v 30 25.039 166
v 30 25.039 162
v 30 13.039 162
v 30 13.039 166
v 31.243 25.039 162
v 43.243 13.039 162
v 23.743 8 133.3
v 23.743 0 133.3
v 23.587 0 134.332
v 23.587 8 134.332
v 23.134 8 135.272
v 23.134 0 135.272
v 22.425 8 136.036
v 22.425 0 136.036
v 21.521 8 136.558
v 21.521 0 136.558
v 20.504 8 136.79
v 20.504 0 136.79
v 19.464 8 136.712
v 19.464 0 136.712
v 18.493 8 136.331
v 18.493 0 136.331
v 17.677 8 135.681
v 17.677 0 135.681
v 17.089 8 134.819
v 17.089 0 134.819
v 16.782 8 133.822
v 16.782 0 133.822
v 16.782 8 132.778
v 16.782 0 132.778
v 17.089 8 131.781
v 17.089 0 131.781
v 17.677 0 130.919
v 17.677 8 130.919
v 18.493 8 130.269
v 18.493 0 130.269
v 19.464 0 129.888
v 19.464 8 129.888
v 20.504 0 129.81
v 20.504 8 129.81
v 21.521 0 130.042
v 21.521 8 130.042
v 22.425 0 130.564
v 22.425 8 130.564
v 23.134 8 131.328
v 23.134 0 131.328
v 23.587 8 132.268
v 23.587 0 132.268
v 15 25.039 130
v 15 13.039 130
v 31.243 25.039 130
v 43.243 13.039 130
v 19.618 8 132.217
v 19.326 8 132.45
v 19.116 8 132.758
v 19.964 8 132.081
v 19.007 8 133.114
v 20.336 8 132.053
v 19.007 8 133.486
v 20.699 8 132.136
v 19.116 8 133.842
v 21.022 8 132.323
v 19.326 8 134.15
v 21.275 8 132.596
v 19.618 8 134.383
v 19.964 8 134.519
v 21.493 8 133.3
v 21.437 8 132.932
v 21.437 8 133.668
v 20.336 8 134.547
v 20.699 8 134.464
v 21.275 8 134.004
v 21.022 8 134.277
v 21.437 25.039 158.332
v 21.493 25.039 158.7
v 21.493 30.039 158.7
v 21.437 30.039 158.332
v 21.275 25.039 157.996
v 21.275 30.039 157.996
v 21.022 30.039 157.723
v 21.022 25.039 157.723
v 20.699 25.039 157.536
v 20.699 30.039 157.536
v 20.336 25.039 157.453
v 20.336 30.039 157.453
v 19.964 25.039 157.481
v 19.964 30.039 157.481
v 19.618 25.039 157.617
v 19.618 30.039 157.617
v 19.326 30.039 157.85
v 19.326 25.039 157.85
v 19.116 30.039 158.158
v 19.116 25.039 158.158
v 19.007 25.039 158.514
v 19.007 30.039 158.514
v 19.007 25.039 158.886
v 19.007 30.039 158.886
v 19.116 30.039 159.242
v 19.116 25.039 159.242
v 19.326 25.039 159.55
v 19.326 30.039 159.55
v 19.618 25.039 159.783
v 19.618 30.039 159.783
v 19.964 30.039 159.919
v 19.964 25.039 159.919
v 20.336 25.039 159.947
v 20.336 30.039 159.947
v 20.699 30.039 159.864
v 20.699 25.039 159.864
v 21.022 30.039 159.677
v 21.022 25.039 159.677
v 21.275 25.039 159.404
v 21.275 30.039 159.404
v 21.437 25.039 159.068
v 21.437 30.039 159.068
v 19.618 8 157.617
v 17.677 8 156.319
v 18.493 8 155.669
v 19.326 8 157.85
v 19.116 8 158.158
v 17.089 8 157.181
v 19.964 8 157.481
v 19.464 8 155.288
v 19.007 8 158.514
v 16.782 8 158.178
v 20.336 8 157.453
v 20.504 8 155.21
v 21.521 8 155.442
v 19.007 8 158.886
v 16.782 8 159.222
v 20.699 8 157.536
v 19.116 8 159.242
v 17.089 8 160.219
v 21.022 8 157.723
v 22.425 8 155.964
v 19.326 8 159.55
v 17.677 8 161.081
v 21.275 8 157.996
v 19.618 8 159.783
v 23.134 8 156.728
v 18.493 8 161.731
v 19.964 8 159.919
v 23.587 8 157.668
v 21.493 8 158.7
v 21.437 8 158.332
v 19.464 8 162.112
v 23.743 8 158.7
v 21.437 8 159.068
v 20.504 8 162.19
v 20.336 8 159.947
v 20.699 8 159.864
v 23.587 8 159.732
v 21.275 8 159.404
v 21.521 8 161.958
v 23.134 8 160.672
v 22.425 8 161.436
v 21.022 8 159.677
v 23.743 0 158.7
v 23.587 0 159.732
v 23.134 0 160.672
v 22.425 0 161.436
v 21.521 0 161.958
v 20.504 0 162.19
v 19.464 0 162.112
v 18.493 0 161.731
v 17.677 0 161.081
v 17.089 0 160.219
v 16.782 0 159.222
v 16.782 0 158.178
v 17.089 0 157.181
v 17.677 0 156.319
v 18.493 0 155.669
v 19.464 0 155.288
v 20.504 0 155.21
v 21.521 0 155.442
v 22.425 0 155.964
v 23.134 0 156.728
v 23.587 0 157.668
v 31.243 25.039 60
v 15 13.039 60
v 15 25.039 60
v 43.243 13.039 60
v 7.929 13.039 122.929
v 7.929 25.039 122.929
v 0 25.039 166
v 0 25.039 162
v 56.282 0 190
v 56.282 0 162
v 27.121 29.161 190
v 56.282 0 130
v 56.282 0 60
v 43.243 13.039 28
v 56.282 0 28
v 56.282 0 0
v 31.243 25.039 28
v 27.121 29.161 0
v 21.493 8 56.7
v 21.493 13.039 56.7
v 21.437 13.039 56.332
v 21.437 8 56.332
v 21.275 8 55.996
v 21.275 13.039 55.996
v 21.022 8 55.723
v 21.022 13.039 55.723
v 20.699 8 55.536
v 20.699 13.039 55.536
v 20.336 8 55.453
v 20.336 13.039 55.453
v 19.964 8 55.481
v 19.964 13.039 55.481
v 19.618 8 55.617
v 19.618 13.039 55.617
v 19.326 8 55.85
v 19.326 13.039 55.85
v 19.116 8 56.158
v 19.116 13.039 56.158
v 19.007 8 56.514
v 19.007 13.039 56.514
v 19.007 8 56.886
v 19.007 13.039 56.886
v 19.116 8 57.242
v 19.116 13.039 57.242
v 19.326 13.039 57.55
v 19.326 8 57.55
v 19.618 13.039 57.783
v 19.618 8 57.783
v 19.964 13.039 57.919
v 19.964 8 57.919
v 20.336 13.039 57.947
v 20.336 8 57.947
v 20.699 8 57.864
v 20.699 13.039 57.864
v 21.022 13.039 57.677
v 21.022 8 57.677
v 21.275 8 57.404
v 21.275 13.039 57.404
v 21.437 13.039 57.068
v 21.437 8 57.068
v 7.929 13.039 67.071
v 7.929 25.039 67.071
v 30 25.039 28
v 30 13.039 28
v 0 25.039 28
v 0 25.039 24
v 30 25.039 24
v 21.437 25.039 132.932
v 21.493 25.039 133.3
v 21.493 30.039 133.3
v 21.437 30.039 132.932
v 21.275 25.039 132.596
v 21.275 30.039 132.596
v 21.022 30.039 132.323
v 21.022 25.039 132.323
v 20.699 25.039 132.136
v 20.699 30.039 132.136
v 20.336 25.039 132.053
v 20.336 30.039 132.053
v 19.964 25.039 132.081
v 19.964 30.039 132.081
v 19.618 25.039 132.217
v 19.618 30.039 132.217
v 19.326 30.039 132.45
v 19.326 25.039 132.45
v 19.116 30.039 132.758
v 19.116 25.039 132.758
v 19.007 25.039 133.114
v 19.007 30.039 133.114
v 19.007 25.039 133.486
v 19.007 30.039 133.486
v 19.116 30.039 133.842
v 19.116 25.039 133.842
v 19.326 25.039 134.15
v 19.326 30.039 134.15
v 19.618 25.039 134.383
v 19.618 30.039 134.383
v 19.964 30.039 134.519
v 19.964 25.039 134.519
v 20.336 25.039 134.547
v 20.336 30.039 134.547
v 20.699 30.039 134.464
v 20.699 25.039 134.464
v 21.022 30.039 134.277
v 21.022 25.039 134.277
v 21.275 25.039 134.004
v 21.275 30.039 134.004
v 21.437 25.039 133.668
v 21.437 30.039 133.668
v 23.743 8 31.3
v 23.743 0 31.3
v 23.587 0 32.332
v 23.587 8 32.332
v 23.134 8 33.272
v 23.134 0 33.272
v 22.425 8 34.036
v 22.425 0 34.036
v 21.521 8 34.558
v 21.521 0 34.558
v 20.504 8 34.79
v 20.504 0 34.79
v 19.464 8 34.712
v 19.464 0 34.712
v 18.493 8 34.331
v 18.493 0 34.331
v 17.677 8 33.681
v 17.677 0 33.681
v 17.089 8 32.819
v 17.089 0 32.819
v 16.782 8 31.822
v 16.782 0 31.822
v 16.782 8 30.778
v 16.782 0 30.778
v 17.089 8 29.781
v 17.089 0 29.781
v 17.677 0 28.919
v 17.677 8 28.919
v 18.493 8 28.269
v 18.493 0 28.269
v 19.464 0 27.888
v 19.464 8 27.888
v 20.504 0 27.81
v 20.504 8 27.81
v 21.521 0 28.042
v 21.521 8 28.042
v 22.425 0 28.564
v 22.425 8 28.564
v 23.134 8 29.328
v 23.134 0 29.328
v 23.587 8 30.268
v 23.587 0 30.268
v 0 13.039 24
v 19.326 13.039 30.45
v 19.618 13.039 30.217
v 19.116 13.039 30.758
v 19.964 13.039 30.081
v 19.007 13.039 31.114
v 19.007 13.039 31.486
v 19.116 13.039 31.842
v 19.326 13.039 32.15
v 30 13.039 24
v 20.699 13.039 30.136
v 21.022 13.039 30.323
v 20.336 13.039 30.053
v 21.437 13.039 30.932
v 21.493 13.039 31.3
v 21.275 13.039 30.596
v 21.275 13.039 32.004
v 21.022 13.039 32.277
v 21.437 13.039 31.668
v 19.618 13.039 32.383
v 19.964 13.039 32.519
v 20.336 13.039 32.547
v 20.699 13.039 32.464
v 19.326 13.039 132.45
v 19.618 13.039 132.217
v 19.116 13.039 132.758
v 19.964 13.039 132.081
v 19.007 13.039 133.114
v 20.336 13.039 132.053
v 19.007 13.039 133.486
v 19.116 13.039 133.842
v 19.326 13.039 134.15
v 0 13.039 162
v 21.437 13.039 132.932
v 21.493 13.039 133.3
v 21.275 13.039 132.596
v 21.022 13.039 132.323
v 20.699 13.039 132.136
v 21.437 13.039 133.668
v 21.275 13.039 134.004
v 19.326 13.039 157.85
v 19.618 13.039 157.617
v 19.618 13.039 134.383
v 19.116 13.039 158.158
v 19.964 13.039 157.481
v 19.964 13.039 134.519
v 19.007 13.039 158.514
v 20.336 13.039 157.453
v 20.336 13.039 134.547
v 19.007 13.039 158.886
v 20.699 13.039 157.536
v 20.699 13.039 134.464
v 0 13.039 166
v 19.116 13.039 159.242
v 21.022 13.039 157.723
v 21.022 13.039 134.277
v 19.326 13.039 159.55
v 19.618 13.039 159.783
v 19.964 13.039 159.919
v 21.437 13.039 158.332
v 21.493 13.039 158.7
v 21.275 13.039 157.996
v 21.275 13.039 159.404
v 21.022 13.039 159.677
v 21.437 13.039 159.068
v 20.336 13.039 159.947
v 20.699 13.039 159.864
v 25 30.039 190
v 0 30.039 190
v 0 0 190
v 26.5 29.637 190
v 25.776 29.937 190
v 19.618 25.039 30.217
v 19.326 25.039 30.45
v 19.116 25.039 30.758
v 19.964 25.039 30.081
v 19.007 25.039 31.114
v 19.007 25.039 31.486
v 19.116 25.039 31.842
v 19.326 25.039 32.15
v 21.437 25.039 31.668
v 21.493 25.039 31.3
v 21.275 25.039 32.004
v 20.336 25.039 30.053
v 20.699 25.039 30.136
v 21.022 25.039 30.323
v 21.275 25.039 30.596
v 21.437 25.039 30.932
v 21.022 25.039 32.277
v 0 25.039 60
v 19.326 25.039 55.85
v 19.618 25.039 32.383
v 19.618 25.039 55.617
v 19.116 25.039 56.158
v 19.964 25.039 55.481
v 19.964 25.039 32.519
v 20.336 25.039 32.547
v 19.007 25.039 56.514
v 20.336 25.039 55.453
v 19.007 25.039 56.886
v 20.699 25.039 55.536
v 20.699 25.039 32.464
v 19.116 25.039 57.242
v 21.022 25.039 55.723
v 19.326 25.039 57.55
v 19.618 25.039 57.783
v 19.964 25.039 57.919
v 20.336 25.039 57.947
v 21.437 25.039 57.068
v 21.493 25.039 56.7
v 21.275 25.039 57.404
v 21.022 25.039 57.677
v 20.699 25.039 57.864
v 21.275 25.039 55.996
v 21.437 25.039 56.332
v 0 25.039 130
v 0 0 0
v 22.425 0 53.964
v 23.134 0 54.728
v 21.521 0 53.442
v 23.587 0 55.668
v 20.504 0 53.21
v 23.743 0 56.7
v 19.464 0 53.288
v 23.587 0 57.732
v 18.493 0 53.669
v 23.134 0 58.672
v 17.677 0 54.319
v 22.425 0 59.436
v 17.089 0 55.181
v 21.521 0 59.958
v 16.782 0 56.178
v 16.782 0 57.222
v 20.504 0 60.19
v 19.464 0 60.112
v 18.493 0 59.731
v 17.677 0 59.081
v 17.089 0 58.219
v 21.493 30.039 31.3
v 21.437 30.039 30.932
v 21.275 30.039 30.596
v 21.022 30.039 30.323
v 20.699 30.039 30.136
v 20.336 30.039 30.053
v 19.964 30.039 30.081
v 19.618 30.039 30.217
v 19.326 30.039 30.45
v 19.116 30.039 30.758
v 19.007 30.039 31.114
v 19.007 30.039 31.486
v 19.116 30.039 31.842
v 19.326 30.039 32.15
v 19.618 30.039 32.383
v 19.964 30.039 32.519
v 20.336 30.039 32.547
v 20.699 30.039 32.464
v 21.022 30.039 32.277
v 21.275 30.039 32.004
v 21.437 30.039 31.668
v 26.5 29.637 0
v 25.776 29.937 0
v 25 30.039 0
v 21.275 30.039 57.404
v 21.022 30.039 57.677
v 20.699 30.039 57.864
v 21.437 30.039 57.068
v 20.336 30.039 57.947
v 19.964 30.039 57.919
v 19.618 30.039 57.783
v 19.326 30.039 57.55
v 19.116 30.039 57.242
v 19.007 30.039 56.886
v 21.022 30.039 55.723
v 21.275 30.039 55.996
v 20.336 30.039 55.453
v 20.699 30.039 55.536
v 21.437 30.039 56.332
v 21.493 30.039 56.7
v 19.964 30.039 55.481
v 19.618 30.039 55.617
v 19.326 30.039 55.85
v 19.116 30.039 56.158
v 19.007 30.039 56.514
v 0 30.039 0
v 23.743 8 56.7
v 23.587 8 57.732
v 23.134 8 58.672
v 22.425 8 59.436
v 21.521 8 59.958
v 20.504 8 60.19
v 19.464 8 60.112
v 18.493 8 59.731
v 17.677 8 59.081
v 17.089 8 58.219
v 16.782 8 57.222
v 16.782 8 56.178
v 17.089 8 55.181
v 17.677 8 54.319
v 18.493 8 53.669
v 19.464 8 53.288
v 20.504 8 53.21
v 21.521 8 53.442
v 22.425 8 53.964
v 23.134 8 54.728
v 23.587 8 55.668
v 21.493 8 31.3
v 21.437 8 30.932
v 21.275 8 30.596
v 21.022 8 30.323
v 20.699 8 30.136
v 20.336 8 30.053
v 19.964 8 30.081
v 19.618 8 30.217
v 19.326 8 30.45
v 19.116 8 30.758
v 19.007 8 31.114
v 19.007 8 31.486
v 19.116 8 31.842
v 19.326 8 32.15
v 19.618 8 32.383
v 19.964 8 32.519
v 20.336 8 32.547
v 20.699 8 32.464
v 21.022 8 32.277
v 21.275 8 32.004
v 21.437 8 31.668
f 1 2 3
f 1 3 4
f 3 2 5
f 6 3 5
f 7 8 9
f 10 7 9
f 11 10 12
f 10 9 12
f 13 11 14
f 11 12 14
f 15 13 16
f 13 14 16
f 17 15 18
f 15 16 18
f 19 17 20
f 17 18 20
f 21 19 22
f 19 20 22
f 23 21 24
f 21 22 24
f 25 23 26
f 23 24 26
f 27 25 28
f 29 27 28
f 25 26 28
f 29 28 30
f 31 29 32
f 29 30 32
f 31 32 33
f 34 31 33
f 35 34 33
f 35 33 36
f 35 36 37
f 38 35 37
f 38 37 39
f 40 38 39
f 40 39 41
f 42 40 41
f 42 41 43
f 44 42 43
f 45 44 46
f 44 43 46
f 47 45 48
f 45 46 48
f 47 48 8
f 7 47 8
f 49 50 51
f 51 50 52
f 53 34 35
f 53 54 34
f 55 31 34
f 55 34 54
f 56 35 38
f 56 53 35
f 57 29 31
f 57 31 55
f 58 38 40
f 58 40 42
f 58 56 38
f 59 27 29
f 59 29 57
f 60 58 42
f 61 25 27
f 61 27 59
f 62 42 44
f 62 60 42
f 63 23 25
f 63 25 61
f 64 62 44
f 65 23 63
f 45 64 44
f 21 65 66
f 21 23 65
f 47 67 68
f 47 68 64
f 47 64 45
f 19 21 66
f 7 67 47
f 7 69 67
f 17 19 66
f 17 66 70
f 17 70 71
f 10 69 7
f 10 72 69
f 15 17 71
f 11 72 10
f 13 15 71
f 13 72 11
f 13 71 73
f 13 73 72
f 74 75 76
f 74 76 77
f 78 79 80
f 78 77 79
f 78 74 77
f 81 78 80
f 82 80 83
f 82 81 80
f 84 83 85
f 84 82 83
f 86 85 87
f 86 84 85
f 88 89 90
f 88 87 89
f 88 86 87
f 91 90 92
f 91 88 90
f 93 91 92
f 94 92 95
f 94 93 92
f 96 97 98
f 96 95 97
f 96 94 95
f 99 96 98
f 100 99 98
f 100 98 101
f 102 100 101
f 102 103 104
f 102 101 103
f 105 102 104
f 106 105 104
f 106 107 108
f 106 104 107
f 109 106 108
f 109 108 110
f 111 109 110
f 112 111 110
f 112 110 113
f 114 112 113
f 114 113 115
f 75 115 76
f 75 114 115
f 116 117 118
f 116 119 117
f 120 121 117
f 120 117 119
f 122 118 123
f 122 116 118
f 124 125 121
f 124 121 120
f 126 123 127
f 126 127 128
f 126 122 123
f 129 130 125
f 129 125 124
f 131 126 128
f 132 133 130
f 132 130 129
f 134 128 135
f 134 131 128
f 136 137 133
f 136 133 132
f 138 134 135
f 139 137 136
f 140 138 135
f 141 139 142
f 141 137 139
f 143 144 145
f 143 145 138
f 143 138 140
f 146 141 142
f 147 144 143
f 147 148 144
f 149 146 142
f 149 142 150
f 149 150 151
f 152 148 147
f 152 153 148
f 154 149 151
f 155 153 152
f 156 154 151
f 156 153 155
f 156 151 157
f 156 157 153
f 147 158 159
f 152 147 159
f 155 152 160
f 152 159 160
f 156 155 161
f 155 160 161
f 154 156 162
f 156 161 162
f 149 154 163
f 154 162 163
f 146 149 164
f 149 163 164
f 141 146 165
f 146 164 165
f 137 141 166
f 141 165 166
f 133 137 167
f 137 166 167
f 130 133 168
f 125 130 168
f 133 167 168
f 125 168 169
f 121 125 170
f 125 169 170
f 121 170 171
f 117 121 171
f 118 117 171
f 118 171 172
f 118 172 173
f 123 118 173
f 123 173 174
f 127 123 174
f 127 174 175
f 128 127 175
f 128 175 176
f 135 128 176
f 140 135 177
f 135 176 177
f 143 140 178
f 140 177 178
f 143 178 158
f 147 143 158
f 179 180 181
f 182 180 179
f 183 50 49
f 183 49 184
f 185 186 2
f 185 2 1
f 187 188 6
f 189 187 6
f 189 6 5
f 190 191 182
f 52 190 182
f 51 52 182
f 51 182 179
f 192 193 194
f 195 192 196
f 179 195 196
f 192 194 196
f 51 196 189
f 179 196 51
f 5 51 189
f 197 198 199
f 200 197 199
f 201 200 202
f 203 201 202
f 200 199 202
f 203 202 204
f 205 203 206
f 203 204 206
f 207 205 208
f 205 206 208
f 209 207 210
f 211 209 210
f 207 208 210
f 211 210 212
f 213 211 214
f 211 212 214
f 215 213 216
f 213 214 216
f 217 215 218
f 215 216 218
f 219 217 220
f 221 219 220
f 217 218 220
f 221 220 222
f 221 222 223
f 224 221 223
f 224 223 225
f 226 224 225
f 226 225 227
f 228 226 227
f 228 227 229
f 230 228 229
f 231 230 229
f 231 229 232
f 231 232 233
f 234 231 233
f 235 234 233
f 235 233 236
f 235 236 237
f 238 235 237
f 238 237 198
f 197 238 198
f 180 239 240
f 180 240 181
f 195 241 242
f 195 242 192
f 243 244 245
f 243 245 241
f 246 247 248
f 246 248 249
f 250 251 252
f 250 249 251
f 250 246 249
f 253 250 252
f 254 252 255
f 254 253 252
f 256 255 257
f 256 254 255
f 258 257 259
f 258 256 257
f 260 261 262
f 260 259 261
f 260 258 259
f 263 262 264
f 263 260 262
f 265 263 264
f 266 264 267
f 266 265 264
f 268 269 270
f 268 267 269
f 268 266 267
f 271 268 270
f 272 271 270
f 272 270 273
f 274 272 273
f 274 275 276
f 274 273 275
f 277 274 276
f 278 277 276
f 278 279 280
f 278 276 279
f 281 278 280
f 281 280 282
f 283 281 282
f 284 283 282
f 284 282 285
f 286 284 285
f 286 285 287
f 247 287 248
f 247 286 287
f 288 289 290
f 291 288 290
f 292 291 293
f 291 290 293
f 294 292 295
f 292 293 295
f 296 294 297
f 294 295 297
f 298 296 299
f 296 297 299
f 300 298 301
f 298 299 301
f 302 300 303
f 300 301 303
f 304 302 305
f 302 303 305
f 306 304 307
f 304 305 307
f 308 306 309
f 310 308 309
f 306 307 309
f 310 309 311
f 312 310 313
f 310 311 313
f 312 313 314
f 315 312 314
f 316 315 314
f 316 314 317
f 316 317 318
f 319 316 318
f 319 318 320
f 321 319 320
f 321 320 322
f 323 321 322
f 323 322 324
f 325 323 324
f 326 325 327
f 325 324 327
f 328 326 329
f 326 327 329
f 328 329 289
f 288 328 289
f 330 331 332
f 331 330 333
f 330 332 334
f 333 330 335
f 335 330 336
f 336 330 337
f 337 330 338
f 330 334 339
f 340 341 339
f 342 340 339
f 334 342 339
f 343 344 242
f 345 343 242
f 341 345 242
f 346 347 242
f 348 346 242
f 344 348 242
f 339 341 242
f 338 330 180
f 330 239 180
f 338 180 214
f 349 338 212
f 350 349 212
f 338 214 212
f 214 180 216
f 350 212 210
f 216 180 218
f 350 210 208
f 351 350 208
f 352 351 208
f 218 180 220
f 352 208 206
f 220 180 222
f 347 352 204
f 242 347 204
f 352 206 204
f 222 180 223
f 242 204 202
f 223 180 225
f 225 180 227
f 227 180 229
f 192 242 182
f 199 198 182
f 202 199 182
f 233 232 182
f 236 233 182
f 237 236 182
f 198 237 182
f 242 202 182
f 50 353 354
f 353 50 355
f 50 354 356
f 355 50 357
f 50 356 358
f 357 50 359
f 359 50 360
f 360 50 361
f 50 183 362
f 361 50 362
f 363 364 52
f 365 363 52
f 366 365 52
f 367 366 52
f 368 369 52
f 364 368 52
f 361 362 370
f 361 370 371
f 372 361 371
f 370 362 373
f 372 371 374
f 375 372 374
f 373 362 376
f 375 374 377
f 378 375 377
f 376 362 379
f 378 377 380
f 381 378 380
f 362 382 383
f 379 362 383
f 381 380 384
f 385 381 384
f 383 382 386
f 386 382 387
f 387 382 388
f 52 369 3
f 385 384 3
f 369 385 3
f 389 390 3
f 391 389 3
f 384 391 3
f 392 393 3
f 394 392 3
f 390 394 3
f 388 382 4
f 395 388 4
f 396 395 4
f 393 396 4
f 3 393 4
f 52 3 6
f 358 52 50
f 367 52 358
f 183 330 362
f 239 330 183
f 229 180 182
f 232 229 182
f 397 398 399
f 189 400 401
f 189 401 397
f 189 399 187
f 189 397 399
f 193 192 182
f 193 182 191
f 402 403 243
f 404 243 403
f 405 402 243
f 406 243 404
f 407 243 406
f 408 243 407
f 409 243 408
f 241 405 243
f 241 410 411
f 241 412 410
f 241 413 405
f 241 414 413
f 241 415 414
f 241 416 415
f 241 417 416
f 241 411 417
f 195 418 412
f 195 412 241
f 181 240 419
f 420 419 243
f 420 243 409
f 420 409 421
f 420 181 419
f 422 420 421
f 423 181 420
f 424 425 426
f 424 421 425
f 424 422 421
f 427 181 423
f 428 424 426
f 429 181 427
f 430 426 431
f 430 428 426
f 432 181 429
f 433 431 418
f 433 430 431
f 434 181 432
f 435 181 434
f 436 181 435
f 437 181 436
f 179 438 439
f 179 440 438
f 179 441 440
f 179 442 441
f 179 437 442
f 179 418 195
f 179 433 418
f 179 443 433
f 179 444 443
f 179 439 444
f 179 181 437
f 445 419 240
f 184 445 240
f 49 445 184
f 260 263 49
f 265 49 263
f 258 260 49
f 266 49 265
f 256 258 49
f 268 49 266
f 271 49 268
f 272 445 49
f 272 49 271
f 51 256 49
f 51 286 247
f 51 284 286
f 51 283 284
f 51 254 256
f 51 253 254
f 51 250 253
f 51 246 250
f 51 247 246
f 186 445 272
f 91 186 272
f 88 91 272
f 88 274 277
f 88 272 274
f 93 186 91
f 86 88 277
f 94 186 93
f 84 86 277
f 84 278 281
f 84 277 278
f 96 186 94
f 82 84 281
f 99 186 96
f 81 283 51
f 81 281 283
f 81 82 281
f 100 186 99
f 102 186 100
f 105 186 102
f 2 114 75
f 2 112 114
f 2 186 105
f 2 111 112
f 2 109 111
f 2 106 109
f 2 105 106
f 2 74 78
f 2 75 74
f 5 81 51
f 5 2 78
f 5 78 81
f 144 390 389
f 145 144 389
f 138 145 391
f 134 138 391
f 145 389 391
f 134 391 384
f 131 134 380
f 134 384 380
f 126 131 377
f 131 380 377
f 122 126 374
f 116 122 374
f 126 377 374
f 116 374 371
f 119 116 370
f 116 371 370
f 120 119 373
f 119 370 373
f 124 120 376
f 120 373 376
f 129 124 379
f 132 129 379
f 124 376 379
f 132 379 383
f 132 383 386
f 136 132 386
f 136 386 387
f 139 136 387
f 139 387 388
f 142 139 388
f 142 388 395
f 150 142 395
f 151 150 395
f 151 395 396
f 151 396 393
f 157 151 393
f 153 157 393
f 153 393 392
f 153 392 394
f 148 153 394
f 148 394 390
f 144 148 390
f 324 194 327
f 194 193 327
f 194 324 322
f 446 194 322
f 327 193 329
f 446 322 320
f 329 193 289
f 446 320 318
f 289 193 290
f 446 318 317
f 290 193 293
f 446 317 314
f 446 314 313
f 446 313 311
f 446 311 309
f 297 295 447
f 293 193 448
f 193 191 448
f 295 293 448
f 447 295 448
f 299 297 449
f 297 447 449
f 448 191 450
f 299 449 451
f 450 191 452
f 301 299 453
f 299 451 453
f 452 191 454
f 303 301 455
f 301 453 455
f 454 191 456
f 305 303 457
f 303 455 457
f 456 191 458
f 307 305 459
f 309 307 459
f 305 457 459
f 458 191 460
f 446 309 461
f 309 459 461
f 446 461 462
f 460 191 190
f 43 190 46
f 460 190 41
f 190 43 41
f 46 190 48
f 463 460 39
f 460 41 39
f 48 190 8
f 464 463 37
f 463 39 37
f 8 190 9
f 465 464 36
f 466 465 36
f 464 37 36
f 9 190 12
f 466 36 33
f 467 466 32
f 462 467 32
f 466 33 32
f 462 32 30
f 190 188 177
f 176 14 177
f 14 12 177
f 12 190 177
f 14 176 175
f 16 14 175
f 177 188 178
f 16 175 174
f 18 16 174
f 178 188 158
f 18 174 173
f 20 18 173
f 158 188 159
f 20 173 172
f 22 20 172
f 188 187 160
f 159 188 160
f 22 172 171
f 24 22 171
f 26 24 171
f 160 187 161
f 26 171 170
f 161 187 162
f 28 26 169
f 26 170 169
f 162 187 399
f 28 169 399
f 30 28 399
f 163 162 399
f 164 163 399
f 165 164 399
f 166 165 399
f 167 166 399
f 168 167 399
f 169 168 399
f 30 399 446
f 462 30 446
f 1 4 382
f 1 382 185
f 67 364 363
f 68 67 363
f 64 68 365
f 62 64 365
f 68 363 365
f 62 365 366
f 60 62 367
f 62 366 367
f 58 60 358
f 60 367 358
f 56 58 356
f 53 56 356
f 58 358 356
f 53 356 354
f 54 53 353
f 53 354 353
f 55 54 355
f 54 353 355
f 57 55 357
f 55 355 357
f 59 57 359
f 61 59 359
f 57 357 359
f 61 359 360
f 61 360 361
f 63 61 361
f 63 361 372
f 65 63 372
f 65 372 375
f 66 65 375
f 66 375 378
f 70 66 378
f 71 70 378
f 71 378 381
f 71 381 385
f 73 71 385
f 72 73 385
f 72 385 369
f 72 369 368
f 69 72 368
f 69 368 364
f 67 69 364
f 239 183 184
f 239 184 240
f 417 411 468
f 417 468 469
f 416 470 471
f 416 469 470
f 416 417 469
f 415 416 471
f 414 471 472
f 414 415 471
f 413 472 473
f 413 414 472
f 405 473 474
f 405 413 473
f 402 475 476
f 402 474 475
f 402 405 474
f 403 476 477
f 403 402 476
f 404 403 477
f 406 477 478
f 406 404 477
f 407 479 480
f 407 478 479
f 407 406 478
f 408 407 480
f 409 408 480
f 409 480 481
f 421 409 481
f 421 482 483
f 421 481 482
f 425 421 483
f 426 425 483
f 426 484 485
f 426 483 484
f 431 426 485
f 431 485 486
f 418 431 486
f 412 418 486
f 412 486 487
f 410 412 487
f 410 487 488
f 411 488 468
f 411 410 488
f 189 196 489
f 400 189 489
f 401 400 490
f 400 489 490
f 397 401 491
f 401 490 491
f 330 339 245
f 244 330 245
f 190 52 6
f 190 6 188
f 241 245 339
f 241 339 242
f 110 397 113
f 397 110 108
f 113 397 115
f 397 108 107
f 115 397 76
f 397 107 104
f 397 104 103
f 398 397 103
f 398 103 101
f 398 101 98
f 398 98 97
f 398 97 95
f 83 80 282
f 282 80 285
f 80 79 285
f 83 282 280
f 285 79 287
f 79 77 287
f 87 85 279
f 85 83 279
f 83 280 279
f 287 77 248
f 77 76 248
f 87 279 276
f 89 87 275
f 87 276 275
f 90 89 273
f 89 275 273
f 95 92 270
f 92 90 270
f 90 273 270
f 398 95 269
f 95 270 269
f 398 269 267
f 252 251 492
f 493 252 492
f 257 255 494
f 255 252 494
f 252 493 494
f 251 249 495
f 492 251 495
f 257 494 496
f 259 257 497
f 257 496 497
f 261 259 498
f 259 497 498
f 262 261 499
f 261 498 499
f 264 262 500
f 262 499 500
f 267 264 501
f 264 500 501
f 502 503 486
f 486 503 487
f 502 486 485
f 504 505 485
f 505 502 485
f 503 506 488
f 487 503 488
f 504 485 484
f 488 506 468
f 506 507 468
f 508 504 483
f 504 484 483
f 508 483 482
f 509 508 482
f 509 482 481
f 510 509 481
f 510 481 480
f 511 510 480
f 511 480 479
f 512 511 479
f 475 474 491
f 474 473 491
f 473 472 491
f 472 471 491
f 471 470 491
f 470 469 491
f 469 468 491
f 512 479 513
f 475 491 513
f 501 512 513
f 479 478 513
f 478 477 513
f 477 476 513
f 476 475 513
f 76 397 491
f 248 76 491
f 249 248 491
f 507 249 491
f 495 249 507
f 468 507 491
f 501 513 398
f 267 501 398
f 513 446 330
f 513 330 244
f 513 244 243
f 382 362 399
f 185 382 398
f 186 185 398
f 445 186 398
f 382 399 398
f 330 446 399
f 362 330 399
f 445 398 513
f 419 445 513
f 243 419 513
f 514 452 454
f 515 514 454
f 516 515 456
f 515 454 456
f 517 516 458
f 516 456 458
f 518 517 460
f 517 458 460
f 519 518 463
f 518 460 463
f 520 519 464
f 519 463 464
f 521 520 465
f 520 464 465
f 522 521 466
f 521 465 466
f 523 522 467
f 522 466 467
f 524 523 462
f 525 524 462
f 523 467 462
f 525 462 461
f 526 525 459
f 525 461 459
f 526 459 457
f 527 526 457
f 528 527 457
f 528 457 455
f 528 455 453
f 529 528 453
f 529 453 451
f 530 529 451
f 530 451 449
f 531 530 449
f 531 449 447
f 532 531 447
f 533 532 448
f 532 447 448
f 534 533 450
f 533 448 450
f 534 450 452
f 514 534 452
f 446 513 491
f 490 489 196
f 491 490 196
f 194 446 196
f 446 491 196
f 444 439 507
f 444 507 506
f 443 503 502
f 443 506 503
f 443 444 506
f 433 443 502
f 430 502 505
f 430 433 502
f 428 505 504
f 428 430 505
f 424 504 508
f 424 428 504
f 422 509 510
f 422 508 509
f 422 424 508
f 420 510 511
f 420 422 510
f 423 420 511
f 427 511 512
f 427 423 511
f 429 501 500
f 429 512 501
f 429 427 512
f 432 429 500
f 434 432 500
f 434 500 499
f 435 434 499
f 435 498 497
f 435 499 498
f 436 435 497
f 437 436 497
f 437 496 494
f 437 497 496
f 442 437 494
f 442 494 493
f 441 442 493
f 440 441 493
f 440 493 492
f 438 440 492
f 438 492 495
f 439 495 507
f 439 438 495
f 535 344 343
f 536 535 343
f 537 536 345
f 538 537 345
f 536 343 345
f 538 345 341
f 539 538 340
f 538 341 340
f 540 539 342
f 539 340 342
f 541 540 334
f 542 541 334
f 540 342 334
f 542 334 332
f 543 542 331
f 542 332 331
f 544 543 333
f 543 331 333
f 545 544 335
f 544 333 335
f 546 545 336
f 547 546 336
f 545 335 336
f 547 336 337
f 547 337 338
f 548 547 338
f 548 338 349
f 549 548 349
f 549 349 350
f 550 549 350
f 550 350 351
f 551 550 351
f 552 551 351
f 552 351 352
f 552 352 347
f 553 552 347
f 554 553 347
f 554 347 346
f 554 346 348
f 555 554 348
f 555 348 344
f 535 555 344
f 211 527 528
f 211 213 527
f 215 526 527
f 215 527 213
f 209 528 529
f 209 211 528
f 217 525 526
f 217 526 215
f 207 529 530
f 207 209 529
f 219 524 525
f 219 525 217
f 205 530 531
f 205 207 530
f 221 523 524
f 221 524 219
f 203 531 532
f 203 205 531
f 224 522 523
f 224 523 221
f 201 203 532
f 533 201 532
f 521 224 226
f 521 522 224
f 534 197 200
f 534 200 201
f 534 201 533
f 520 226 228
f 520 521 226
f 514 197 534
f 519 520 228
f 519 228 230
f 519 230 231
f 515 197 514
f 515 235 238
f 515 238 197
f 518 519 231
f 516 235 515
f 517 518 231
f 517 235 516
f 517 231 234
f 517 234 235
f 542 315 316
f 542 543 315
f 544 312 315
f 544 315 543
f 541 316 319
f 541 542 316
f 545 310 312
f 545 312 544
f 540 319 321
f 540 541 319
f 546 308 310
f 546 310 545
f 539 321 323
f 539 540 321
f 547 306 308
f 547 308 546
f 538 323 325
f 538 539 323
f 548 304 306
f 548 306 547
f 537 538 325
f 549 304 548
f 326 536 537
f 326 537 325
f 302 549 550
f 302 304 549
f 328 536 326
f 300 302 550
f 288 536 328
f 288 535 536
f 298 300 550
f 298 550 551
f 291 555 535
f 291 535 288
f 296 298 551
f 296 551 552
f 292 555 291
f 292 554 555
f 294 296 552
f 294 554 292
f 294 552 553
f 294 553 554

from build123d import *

# Parameters (mm, degrees)
SALIENTE_EXTRUIR1_DEPTH    = 190
CROQUIS3_W                 = 56.281965067
CROQUIS3_H                 = 32
CORTAR_EXTRUIR1_DEPTH      = 25.039324
CORTAR_EXTRUIR3_DEPTH      = 25.039324
SALIENTE_EXTRUIR2_REACH    = 62
SALIENTE_EXTRUIR3_REACH    = 132
CROQUIS7_W                 = 4
CROQUIS7_H                 = 12
CORTAR_EXTRUIR6_DEPTH      = 30
CROQUIS8_R                 = 1.25
CORTAR_EXTRUIR7_DEPTH      = 18
CORTAR_EXTRUIR7_DEPTH_BACK = 14.03932438
CROQUIS9_R                 = 3.5
CORTAR_EXTRUIR8_DEPTH      = 8


with BuildPart() as part:
    # Croquis1 → Saliente-Extruir1 (new body)
    with BuildSketch(Plane.XY):
        with BuildLine():
            Line((56.281965067, 0), (27.121320344, 29.160644724))
            ThreePointArc((27.121320344, 29.160644724), (26.148050297, 29.810962978), (25, 30.03932438))
            Line((25, 30.03932438), (0, 30.03932438))
            Line((0, 30.03932438), (0, 0))
            Line((0, 0), (56.281965067, 0))
        make_face()
    extrude(amount=SALIENTE_EXTRUIR1_DEPTH)

    # Croquis3 → Cortar-Extruir1 (cut)
    with BuildSketch(Plane.XZ):
        with Locations((28.140982534, 146)):
            Rectangle(CROQUIS3_W, CROQUIS3_H)
        with Locations((28.140982534, 44)):
            Rectangle(CROQUIS3_W, CROQUIS3_H)
    extrude(amount=-CORTAR_EXTRUIR1_DEPTH, mode=Mode.SUBTRACT)

    # Croquis4 → Cortar-Extruir3 (cut)
    with BuildSketch(Plane.XZ):
        Polygon((0, 130), (15, 130), (7.928932188, 122.928932188), (7.928932188, 67.071067812), (15, 60), (0, 60), align=None)
    extrude(amount=-CORTAR_EXTRUIR3_DEPTH, mode=Mode.SUBTRACT)

    # Croquis5 → Saliente-Extruir2 (add, up to next)
    with BuildSketch(Plane.XY.offset(130), mode=Mode.PRIVATE) as saliente_extruir2_sk1:
        Polygon((56.281965067, 0), (0, 0), (0, 13.03932438), (43.242640687, 13.03932438), align=None)
    saliente_extruir2_tool1 = extrude(saliente_extruir2_sk1.sketch, amount=SALIENTE_EXTRUIR2_REACH, mode=Mode.PRIVATE) - part.part
    add(saliente_extruir2_tool1.solids().sort_by_distance((25.023515, 6.234935, 130))[0])

    # Croquis6 → Saliente-Extruir3 (add, up to next)
    with BuildSketch(Plane(origin=(0, 0, 130), x_dir=(-1, 0, 0), z_dir=(0, 0, -1)), mode=Mode.PRIVATE) as saliente_extruir3_sk1:
        Polygon((0, 0), (0, 13.03932438), (-43.242640687, 13.03932438), (-56.281965067, 0), align=None)
    saliente_extruir3_tool1 = extrude(saliente_extruir3_sk1.sketch, amount=SALIENTE_EXTRUIR3_REACH, mode=Mode.PRIVATE) - part.part
    add(saliente_extruir3_tool1.solids().sort_by_distance((25.023515, 6.234935, 130))[0])

    # Croquis7 → Cortar-Extruir6 (cut)
    with BuildSketch(Plane.ZY):
        with Locations((26, 19.03932438)):
            Rectangle(CROQUIS7_W, CROQUIS7_H)
        with Locations((164, 19.03932438)):
            Rectangle(CROQUIS7_W, CROQUIS7_H)
    extrude(amount=-CORTAR_EXTRUIR6_DEPTH, mode=Mode.SUBTRACT)

    # Croquis8 → Cortar-Extruir7 (cut, two sides)
    with BuildSketch(Plane(origin=(0, 13.03932438, 0), x_dir=(1, 0, 0), z_dir=(0, 1, 0))) as cortar_extruir7_sk:
        with Locations((20.242640687, -158.7)):
            Circle(CROQUIS8_R)
        with Locations((20.242640687, -133.3)):
            Circle(CROQUIS8_R)
        with Locations((20.242640687, -31.3)):
            Circle(CROQUIS8_R)
        with Locations((20.242640687, -56.7)):
            Circle(CROQUIS8_R)
    extrude(amount=CORTAR_EXTRUIR7_DEPTH, mode=Mode.SUBTRACT)
    extrude(cortar_extruir7_sk.sketch, amount=-CORTAR_EXTRUIR7_DEPTH_BACK, mode=Mode.SUBTRACT)

    # Croquis9 → Cortar-Extruir8 (cut)
    with BuildSketch(Plane.XZ):
        with Locations((20.242640687, 158.7)):
            Circle(CROQUIS9_R)
        with Locations((20.242640687, 133.3)):
            Circle(CROQUIS9_R)
        with Locations((20.242640687, 56.7)):
            Circle(CROQUIS9_R)
        with Locations((20.242640687, 31.3)):
            Circle(CROQUIS9_R)
    extrude(amount=-CORTAR_EXTRUIR8_DEPTH, mode=Mode.SUBTRACT)


solid = part.part
